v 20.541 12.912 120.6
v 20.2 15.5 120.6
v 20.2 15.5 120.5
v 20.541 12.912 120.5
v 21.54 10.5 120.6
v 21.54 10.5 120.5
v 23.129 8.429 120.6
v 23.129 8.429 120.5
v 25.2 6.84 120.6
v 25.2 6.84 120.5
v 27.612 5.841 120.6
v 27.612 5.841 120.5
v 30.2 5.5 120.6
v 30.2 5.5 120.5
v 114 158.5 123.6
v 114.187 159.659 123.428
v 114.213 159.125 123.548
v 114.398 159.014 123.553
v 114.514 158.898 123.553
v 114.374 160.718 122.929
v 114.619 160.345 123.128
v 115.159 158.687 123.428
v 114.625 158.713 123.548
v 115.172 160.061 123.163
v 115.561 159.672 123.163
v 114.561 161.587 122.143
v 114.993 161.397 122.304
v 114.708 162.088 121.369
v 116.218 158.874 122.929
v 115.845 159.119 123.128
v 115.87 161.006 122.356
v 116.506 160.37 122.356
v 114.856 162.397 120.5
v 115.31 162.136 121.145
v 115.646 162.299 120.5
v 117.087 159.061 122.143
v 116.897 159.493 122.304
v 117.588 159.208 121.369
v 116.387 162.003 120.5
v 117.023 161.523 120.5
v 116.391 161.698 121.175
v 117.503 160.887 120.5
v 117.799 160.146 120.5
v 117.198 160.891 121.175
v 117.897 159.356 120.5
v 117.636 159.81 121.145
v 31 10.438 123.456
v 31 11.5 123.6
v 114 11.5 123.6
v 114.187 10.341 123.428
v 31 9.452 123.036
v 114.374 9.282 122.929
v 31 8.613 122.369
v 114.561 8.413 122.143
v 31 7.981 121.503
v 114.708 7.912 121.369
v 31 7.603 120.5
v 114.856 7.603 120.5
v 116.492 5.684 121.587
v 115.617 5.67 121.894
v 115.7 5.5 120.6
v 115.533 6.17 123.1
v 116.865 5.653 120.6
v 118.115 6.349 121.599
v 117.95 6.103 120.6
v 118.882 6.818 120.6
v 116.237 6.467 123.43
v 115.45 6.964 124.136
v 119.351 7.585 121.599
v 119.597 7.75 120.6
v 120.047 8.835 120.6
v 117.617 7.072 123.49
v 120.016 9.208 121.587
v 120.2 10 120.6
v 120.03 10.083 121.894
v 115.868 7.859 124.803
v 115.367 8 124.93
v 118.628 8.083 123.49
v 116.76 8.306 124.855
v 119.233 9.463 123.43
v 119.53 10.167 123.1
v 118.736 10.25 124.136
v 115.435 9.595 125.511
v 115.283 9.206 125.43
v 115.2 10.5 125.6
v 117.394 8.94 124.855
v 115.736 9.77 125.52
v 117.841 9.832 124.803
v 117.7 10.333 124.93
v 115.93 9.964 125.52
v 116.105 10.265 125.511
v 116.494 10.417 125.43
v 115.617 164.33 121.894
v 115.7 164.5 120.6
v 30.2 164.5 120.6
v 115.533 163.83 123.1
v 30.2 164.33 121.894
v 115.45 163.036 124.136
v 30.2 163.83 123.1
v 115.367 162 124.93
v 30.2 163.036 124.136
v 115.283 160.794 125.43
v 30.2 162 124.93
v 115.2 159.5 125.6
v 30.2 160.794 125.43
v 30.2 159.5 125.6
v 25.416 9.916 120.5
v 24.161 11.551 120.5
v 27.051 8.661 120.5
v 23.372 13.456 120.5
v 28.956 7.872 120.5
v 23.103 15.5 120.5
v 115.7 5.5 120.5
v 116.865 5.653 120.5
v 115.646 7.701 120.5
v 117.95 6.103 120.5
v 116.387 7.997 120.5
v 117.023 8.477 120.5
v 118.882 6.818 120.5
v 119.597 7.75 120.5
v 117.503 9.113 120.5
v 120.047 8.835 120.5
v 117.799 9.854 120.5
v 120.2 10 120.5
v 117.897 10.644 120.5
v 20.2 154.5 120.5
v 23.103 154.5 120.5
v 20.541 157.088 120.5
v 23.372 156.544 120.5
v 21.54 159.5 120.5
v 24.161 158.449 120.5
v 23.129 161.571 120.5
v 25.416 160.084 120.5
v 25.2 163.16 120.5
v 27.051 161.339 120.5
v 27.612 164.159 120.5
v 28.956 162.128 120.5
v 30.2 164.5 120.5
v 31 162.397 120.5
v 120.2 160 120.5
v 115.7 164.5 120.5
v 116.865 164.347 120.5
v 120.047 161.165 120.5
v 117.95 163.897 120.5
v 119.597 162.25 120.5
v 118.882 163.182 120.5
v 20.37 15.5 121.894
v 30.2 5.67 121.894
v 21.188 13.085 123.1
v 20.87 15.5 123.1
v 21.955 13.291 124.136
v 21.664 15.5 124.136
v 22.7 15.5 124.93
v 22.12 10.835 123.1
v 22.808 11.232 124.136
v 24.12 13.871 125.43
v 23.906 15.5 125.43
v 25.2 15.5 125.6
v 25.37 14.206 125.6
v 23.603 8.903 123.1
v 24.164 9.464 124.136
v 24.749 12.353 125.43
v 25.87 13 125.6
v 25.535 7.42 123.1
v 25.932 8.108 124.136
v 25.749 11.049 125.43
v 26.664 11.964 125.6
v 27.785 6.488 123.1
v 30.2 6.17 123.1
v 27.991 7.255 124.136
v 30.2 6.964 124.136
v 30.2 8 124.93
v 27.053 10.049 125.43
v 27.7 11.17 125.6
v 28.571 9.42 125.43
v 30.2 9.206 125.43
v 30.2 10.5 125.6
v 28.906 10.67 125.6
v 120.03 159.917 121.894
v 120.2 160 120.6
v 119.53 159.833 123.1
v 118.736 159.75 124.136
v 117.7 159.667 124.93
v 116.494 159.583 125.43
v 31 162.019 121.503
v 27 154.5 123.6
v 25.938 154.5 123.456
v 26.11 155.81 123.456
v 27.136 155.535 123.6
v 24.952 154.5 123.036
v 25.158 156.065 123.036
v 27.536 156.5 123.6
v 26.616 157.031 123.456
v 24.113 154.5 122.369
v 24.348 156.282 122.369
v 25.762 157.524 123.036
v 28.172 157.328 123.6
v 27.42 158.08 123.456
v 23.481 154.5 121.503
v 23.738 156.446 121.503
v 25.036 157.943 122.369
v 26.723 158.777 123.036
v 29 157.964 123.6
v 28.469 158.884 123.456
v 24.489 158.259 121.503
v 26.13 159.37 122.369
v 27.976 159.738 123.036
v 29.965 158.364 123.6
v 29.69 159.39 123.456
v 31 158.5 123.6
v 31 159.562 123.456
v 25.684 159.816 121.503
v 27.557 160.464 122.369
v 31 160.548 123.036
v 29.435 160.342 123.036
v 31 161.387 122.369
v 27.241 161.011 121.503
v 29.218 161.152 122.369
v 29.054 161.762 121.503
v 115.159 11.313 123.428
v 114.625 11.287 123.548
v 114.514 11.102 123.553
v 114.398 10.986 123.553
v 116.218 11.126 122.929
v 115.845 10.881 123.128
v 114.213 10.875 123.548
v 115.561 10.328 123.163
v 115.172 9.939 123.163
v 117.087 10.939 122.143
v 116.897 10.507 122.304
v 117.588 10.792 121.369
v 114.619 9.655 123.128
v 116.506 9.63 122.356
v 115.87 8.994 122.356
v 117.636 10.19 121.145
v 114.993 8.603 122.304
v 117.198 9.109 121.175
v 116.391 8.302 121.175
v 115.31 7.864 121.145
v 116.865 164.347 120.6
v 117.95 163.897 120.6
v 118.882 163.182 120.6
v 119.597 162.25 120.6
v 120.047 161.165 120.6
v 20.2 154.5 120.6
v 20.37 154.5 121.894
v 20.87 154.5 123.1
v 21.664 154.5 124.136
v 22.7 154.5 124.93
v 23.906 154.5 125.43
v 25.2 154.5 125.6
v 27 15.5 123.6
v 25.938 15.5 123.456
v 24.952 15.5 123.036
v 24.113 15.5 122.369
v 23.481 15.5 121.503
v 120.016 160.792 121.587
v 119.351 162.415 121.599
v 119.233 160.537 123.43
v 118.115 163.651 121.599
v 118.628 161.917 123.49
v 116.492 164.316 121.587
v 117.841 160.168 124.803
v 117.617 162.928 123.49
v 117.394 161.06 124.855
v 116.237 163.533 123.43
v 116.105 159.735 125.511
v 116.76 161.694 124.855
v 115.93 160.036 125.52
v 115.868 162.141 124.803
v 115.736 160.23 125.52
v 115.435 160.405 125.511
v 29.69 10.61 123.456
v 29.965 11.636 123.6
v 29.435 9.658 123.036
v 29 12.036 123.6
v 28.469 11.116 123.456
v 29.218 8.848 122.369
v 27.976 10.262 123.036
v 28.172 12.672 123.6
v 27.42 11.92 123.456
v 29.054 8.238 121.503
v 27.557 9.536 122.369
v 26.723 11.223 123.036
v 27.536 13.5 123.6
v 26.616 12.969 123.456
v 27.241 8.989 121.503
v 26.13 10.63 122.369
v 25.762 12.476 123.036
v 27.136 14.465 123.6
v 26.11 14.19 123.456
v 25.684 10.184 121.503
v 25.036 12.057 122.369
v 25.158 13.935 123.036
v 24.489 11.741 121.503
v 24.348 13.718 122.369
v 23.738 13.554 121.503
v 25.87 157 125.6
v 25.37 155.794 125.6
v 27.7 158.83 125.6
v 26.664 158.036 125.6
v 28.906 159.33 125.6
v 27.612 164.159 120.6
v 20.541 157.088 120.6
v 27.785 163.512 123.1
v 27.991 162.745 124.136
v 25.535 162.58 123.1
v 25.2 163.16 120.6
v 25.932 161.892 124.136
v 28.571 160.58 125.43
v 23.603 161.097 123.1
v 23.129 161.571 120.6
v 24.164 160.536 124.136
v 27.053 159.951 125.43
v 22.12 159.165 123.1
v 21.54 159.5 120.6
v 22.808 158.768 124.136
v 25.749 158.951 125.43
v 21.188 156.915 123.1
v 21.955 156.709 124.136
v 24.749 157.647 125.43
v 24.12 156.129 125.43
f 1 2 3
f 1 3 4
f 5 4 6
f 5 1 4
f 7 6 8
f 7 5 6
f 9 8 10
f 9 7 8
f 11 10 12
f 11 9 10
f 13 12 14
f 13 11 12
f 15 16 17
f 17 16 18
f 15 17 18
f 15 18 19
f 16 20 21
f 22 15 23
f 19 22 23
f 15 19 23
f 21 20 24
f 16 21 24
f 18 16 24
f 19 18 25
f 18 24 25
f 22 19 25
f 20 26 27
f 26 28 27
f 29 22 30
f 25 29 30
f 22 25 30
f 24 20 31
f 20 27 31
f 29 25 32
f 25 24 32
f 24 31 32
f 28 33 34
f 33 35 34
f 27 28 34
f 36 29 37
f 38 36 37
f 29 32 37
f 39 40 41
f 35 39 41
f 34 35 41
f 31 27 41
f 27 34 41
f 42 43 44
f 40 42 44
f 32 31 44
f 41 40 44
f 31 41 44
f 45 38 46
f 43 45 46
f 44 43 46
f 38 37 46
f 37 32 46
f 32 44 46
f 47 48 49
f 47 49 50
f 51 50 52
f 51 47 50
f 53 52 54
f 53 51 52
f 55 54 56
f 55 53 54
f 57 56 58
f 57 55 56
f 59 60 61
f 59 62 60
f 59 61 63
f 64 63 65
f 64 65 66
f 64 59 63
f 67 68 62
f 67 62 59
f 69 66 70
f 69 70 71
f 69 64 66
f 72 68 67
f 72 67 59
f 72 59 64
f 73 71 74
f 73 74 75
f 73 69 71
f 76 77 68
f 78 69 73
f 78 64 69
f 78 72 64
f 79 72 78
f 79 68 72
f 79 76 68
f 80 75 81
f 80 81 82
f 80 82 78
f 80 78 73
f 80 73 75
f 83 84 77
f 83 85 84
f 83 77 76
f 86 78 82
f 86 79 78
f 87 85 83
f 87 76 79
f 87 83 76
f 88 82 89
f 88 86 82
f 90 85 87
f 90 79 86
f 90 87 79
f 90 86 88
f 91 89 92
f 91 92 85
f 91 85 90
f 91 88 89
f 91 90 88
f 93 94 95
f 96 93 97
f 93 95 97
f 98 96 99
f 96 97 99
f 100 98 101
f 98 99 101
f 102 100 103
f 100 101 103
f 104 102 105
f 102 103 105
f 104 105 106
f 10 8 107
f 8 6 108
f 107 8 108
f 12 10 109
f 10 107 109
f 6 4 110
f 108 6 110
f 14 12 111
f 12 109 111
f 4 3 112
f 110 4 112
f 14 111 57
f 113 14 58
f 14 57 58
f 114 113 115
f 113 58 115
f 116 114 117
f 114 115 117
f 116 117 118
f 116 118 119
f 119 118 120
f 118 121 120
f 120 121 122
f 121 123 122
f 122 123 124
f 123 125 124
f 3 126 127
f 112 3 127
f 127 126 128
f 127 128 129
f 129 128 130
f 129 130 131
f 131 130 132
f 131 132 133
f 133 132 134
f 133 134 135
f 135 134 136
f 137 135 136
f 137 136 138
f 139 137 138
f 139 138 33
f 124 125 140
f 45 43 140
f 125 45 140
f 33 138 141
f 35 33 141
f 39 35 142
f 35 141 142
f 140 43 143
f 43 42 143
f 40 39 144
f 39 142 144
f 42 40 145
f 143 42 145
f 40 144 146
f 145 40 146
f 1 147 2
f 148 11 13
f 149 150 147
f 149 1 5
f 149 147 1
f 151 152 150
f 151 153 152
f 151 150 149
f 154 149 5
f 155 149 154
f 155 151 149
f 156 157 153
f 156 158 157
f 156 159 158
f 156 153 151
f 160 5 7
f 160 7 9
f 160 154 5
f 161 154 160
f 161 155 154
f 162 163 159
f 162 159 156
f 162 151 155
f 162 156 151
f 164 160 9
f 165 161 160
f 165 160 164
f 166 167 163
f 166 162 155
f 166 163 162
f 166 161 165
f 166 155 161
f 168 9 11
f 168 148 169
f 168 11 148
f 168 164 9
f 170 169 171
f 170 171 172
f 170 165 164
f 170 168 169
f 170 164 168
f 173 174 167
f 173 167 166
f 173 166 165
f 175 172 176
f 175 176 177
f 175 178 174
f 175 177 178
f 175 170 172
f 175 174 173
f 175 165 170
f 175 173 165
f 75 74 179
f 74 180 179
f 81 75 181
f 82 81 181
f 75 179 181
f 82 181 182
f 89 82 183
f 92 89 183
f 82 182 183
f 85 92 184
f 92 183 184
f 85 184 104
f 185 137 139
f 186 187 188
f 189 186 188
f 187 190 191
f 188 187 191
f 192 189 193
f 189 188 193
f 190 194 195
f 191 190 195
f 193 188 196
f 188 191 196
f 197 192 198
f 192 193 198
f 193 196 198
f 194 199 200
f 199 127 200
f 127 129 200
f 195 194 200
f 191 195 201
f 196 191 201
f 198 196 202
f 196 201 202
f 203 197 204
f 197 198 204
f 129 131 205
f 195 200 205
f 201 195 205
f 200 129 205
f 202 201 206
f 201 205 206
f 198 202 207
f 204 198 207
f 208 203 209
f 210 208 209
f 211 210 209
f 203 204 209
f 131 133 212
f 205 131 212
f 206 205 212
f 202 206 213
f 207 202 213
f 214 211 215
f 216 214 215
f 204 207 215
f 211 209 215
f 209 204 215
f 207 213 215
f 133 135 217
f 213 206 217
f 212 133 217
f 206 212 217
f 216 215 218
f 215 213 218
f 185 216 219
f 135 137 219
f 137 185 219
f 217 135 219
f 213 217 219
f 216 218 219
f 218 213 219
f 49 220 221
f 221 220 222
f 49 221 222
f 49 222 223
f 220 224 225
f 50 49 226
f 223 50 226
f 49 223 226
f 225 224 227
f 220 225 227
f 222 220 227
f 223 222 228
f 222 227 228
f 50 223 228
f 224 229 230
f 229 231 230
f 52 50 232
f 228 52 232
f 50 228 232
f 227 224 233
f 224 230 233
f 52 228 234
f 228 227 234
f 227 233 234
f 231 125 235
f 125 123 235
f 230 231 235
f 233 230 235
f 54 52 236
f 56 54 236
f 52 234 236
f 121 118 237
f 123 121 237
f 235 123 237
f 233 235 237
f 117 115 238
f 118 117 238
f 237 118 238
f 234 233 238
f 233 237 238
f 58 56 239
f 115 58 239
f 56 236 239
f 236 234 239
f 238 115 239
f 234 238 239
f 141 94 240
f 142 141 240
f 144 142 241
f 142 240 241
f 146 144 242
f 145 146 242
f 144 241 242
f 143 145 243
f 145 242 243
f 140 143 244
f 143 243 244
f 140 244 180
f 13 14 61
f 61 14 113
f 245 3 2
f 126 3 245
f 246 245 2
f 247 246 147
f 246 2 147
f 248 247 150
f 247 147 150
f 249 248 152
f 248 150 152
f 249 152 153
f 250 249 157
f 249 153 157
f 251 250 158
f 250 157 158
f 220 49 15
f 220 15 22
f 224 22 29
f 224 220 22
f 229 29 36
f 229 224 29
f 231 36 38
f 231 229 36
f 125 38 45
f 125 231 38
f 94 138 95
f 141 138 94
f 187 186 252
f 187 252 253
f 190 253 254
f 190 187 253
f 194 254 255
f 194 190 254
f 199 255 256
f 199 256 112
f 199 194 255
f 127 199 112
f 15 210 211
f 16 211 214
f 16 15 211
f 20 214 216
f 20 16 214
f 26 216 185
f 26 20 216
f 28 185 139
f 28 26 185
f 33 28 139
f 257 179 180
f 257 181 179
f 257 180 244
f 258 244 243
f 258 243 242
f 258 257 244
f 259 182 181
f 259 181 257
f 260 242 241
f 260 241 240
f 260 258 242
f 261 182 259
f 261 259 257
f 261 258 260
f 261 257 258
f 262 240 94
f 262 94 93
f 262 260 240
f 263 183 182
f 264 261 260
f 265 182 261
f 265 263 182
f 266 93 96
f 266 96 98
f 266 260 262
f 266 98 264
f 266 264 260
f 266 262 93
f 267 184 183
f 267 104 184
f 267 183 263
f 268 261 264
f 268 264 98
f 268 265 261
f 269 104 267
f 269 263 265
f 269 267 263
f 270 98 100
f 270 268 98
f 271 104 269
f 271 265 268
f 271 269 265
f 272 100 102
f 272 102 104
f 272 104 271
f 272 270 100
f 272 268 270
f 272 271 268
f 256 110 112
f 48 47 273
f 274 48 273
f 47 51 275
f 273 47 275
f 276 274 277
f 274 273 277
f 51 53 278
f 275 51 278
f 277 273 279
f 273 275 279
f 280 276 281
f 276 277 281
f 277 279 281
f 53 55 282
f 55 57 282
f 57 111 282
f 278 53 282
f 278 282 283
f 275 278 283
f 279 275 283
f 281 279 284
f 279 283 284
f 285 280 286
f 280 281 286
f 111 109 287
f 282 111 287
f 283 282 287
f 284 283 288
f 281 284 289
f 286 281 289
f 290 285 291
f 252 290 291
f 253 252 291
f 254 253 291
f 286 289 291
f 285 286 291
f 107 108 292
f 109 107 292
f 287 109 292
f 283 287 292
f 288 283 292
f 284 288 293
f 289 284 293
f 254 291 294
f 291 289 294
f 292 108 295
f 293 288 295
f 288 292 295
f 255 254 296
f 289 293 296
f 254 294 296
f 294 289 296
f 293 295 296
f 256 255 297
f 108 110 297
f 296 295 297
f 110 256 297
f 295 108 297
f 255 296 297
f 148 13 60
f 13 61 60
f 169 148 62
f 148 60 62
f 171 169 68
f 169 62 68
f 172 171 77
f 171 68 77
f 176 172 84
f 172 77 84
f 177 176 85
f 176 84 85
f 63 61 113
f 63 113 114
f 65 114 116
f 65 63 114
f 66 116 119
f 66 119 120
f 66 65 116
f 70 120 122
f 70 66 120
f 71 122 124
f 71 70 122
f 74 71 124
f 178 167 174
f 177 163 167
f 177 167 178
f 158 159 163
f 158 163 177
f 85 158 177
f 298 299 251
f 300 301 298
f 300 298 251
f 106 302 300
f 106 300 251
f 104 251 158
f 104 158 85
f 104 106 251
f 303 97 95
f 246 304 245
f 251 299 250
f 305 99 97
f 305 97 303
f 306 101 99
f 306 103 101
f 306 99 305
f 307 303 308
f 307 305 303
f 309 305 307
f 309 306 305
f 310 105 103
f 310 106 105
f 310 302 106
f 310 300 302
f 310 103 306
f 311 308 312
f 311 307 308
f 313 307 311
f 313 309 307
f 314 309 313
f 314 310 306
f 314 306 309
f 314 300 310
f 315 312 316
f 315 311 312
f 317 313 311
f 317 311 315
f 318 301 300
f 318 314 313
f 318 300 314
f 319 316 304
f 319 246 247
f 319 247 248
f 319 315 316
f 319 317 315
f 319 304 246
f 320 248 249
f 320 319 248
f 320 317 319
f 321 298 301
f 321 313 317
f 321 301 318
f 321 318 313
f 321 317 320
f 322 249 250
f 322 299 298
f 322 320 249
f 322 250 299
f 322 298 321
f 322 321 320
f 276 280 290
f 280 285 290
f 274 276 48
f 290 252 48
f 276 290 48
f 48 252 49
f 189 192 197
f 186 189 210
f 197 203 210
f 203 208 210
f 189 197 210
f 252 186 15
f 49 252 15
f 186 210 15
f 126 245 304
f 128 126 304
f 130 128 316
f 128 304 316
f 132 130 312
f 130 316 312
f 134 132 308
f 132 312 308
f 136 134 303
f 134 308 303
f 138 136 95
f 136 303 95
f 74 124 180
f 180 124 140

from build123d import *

# Parameters (mm, degrees)
BOX020_W     = 95
BOX020_H     = 155
BOX020_DEPTH = 5.1
FILLET016_R  = 3
FILLET017_R  = 8
FILLET018_R  = 4
BOX019_W     = 100
BOX019_H     = 159
BOX019_DEPTH = 5.1
FILLET012_R  = 10
FILLET013_R  = 4.5
FILLET014_R  = 5


with BuildPart() as fillet018:
    # Box020 → Box020 (new body)
    with BuildSketch(Plane(origin=(23, 7.5, 122.5), x_dir=(1, 0, 0), z_dir=(0, 0, 1))):
        with Locations((47.5, 77.5)):
            Rectangle(BOX020_W, BOX020_H)
    extrude(amount=BOX020_DEPTH)

    # Fillet016
    fillet016_edges = [fillet018.edges().sort_by_distance(p)[0] for p in [
        (118, 7.5, 125.05),
        (118, 162.5, 125.05),
    ]]
    fillet(fillet016_edges, radius=FILLET016_R)

    # Fillet017
    fillet017_edges = [fillet018.edges().sort_by_distance(p)[0] for p in [
        (23, 162.5, 125.05),
        (23, 7.5, 125.05),
    ]]
    fillet(fillet017_edges, radius=FILLET017_R)

    # Fillet018
    fillet018_edges = [fillet018.edges().sort_by_distance(p)[0] for p in [
        (23, 85, 127.6),
    ]]
    fillet(fillet018_edges, radius=FILLET018_R)


with BuildPart() as fillet018_1:
    # Fillet018 placement: moved
    add(fillet018.part.moved(Location((0, 0, -4))))


with BuildPart() as cut354:
    # Box019 → Box019 (new body)
    with BuildSketch(Plane(origin=(19.5, 5.5, 122.5), x_dir=(1, 0, 0), z_dir=(0, 0, 1))):
        with Locations((50, 79.5)):
            Rectangle(BOX019_W, BOX019_H)
    extrude(amount=BOX019_DEPTH)

    # Fillet012
    fillet012_edges = [cut354.edges().sort_by_distance(p)[0] for p in [
        (19.5, 5.5, 125.05),
        (19.5, 164.5, 125.05),
    ]]
    fillet(fillet012_edges, radius=FILLET012_R)

    # Fillet013
    fillet013_edges = [cut354.edges().sort_by_distance(p)[0] for p in [
        (119.5, 5.5, 125.05),
        (119.5, 164.5, 125.05),
    ]]
    fillet(fillet013_edges, radius=FILLET013_R)

    # Fillet014
    fillet014_edges = [cut354.edges().sort_by_distance(p)[0] for p in [
        (72.25, 5.5, 127.6),
        (119.5, 85, 127.6),
        (19.5, 85, 127.6),
        (72.25, 164.5, 127.6),
    ]]
    fillet(fillet014_edges, radius=FILLET014_R)


with BuildPart() as cut354_1:
    # Fillet014 placement: moved
    add(cut354.part.moved(Location((0.7, 0, -2))))

    # Cut014: cut Fillet018
    add(fillet018_1.part, mode=Mode.SUBTRACT)


solid = cut354_1.part
